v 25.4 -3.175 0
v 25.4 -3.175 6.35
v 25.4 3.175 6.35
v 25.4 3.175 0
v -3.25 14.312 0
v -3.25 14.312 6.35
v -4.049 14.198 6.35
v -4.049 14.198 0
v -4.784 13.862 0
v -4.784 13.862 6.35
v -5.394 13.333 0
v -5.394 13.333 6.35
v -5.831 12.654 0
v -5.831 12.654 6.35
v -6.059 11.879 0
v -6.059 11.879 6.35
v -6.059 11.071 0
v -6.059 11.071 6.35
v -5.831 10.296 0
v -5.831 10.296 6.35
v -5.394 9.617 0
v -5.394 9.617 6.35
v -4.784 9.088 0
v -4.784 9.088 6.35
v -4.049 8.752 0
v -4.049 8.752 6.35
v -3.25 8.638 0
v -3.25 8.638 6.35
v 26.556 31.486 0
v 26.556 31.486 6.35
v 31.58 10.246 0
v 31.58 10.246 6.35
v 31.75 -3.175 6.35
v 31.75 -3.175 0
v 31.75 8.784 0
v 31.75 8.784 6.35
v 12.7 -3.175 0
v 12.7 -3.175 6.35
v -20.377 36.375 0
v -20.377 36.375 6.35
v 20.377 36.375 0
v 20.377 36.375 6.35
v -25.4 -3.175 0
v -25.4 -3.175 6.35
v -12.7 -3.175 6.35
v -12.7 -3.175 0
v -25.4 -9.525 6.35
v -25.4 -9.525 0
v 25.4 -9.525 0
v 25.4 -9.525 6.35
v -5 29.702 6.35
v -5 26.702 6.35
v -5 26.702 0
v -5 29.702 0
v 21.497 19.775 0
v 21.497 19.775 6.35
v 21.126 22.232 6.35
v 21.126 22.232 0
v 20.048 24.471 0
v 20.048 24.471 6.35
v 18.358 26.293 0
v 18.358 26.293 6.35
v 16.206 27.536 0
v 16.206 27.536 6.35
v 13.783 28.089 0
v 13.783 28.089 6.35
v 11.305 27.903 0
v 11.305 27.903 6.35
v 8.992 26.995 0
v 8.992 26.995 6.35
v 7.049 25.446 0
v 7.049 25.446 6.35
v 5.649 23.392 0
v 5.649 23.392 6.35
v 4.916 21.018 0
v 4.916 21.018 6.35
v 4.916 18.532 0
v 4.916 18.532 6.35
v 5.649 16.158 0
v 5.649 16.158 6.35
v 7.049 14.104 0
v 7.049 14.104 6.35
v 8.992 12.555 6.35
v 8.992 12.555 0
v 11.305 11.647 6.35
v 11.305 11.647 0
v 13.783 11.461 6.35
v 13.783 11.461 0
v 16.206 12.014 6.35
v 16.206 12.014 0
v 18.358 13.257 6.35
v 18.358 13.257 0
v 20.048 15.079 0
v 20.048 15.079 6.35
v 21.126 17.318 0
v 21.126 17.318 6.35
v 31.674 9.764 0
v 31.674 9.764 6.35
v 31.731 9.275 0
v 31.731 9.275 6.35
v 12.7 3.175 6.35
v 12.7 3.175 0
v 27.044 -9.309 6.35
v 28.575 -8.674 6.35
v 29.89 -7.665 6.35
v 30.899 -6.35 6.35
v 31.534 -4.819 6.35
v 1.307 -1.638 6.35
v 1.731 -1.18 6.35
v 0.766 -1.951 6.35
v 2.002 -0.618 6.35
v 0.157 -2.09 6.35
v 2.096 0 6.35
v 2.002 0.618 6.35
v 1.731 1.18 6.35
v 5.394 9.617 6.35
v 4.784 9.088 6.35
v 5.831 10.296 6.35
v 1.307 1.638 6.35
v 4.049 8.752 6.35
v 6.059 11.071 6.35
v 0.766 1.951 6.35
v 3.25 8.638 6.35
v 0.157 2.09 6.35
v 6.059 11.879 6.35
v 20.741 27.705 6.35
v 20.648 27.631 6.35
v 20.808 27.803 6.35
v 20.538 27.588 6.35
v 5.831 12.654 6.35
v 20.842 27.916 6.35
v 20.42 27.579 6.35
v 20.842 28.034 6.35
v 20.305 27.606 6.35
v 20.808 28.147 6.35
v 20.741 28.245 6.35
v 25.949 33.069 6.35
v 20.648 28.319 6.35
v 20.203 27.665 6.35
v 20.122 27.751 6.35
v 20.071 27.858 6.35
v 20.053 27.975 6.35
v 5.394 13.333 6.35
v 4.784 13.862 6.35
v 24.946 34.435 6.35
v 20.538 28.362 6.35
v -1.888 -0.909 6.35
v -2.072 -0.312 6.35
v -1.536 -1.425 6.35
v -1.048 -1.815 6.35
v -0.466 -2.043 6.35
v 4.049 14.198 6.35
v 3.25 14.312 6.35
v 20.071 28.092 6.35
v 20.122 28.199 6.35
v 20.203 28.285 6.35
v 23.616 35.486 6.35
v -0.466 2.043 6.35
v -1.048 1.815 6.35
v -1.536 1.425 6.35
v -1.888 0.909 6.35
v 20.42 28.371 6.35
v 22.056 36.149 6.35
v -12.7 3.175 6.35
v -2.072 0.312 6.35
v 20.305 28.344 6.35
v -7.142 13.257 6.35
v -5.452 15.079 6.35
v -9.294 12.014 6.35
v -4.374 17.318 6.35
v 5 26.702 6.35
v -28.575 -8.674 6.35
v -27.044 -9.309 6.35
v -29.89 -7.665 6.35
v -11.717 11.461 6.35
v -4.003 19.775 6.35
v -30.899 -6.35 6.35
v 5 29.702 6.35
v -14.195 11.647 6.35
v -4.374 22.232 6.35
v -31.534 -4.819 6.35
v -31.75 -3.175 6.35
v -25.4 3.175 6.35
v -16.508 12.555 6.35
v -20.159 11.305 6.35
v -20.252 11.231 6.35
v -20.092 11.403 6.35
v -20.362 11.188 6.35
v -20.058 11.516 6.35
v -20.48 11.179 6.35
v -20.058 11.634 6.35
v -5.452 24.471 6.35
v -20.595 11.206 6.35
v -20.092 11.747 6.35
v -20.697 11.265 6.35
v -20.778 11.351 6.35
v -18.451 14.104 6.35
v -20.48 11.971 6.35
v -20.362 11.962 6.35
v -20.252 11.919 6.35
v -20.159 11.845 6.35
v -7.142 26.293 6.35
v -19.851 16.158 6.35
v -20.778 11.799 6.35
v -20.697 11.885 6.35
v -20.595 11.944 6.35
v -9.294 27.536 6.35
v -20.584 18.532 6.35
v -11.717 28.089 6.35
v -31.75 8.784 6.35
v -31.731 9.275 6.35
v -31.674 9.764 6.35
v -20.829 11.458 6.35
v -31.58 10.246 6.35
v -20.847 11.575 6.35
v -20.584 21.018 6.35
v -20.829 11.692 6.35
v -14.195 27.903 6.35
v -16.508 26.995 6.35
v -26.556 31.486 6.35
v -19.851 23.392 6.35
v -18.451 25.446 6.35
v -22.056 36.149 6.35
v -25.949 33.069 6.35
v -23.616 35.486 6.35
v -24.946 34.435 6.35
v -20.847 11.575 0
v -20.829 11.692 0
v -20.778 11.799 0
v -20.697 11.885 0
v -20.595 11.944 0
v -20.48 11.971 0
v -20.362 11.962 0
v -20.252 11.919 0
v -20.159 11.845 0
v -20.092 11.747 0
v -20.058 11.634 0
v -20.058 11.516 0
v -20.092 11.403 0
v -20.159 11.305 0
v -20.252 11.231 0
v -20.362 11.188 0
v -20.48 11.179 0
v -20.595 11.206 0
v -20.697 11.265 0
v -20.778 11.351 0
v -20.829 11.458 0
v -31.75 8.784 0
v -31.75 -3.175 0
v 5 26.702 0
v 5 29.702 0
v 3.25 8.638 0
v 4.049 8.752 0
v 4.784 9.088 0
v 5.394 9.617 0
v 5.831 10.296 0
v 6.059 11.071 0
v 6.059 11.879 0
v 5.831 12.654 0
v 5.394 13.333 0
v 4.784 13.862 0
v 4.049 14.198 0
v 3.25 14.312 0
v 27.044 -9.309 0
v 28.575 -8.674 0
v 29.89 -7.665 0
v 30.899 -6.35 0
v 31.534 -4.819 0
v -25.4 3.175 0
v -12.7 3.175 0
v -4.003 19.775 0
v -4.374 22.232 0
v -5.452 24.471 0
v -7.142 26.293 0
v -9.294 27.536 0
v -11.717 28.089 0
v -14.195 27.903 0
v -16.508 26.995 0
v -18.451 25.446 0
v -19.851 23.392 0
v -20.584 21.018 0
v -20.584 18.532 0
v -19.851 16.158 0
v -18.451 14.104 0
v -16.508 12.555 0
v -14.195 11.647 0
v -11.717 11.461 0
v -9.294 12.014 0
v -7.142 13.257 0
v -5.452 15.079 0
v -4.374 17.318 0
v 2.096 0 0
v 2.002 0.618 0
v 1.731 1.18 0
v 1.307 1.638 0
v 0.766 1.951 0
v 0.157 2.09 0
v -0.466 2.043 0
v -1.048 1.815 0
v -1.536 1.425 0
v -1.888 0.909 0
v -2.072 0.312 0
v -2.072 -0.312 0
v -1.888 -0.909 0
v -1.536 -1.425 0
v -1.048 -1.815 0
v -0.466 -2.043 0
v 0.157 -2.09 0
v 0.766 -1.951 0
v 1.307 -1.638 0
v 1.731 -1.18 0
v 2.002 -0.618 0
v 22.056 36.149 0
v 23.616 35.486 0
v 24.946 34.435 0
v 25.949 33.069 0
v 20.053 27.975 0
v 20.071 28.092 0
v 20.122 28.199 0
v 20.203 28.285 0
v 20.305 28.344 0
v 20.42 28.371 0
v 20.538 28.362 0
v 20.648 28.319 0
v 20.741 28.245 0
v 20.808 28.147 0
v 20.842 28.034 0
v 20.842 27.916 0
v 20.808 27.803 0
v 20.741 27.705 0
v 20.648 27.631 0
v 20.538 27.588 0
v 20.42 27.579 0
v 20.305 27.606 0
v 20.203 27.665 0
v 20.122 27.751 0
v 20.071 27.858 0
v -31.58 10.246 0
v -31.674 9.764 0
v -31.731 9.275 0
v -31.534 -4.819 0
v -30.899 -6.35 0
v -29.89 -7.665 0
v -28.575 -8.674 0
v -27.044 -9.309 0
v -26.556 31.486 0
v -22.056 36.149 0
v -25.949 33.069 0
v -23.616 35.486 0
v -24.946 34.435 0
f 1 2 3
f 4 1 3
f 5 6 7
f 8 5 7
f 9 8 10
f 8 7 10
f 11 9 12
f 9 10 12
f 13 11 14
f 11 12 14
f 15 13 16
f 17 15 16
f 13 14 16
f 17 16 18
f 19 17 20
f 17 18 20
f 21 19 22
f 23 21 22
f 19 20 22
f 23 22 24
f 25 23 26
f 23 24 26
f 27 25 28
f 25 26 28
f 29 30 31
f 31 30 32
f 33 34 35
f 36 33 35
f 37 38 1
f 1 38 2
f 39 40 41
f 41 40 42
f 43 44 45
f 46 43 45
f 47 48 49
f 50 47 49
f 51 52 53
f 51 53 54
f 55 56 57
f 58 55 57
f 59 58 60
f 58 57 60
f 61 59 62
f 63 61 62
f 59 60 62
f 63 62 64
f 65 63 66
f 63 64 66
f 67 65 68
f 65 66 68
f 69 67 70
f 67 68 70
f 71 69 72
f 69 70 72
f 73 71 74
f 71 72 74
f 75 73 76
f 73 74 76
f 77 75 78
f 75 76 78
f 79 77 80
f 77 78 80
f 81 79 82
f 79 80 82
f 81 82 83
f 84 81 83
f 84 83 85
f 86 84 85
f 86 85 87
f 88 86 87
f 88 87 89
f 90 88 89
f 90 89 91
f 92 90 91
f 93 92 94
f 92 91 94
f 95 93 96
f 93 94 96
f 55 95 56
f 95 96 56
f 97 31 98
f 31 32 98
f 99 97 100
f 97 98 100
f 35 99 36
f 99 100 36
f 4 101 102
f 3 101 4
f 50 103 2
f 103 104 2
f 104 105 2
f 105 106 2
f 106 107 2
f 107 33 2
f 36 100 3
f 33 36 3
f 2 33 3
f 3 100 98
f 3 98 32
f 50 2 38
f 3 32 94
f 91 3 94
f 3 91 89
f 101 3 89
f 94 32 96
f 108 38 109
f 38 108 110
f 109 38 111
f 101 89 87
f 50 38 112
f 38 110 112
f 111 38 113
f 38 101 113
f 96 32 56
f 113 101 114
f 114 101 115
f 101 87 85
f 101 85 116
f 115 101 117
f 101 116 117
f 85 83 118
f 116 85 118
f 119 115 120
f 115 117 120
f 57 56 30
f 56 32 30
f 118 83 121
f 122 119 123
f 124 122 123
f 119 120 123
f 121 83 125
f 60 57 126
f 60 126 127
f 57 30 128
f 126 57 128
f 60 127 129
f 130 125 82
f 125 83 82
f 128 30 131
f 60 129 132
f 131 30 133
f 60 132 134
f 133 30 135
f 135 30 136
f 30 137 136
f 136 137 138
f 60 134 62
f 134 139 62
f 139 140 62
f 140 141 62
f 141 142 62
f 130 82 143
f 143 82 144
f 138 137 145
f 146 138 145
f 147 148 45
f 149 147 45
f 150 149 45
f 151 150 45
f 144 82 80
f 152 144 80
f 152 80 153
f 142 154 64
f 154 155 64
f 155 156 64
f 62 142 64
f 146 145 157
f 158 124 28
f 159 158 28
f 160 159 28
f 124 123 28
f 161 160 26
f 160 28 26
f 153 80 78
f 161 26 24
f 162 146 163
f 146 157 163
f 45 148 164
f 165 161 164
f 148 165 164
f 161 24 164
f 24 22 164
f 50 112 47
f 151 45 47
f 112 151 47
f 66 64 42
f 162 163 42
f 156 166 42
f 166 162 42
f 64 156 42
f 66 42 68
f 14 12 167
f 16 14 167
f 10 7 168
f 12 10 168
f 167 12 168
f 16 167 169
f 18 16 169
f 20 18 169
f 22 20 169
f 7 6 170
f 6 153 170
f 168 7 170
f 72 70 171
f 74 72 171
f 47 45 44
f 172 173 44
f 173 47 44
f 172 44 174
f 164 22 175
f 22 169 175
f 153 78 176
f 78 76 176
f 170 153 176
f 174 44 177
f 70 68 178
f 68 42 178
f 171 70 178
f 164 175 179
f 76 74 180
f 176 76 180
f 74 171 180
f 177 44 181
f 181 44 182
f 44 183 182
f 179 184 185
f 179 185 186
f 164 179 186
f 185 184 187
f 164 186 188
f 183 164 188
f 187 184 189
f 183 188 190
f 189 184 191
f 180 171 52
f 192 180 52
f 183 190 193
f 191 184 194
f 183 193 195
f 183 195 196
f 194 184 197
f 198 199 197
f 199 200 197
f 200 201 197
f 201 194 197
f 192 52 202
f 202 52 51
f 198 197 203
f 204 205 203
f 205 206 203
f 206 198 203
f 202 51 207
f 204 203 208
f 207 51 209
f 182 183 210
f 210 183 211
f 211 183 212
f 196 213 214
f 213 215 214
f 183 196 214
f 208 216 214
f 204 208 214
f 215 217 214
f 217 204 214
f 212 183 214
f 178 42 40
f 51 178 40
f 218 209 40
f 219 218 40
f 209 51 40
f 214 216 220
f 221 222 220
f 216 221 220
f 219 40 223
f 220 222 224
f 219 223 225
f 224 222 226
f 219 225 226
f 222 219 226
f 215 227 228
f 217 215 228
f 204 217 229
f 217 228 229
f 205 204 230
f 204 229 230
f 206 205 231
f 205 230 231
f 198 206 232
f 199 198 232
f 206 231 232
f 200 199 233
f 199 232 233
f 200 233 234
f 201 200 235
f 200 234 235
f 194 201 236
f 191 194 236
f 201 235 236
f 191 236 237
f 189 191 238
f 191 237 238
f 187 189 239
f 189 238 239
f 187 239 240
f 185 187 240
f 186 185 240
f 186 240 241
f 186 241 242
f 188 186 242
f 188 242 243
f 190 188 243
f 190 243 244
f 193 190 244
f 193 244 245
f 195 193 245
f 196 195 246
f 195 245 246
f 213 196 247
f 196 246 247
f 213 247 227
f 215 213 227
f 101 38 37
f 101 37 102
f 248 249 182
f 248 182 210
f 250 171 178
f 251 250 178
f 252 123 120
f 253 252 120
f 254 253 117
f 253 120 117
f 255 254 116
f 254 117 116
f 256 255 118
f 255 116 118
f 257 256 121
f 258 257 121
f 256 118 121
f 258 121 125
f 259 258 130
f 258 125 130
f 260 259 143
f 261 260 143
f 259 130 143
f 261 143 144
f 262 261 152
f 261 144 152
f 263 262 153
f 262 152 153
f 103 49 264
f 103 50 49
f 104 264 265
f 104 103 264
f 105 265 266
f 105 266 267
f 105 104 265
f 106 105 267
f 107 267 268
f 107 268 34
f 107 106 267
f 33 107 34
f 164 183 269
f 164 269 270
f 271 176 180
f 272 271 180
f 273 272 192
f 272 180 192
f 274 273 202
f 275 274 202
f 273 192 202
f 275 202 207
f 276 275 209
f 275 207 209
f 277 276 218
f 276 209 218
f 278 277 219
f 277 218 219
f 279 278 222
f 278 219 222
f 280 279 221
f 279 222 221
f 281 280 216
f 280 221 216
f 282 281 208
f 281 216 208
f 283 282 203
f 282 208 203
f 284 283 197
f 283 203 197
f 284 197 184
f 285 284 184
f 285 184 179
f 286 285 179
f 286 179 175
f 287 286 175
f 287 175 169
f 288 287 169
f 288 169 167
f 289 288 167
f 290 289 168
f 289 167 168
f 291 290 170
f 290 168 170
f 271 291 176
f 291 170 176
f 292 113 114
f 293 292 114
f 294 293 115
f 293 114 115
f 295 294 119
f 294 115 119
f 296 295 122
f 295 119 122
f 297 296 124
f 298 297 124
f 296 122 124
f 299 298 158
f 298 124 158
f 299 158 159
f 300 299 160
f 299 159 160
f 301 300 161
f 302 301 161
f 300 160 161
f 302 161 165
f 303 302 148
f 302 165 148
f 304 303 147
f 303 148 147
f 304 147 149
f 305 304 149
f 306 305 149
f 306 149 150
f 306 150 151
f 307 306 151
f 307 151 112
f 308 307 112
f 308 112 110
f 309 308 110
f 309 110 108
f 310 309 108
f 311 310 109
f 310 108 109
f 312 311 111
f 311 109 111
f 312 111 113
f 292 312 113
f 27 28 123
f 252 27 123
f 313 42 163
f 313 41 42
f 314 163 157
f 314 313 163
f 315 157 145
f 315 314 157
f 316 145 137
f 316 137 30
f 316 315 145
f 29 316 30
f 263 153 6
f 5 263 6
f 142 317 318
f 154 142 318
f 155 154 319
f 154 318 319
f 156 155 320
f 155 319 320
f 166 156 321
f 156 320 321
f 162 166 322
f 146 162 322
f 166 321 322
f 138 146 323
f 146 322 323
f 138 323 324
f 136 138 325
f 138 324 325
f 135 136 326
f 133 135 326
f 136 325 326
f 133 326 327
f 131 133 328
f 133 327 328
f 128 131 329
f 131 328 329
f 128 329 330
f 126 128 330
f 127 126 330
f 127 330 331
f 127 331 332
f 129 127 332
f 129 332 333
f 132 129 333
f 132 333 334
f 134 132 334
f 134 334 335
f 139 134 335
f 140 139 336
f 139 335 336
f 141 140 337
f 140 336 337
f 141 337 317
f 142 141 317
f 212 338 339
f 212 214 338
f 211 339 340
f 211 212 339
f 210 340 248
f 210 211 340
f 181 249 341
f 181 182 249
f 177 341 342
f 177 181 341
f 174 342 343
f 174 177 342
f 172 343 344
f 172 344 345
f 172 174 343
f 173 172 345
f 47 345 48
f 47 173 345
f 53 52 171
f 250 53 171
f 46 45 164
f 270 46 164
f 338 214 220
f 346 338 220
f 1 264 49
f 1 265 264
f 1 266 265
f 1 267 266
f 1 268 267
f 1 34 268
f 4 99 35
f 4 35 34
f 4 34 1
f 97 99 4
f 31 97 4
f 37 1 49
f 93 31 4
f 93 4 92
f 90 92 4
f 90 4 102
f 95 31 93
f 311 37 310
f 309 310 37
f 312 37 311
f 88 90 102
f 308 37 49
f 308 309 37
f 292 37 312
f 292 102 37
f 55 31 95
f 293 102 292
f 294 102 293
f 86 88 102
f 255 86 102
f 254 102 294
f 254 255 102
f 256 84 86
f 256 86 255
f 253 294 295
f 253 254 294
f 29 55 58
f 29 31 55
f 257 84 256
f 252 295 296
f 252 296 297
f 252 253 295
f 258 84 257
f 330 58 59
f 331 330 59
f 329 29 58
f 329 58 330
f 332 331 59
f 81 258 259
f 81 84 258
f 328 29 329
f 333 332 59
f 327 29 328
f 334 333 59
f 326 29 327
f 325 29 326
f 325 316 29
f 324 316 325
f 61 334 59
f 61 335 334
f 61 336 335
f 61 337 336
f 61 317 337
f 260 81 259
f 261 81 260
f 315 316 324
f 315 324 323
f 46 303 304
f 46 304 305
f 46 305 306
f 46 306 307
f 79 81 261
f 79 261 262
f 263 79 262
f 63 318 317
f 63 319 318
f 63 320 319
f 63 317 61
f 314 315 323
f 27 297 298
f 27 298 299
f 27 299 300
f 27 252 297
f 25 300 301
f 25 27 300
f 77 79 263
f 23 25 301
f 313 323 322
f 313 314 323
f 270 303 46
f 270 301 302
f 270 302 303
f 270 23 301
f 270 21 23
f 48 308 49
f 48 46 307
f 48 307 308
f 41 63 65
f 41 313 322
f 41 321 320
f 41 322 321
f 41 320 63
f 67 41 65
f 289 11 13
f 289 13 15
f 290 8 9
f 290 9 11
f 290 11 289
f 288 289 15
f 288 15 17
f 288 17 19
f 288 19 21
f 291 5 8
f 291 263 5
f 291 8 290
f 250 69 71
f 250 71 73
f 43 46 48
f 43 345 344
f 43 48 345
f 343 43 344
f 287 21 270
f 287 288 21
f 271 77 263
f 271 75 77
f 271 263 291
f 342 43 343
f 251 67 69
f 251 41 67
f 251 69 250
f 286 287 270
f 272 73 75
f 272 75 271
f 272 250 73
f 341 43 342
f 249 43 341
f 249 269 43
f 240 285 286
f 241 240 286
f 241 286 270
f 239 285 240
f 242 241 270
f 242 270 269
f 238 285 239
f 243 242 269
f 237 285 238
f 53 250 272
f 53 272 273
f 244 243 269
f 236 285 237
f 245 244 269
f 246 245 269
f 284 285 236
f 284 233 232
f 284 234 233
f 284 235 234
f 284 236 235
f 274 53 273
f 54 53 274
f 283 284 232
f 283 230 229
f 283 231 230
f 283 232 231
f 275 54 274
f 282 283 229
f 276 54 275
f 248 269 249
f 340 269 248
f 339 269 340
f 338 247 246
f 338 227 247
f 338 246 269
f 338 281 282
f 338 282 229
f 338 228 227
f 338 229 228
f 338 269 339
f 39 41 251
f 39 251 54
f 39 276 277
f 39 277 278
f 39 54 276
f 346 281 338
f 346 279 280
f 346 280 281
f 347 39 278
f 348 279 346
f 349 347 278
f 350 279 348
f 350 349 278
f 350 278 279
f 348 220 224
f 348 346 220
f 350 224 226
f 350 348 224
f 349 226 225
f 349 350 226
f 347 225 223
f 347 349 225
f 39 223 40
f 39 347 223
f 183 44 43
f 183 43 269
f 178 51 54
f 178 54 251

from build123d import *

# Parameters (mm, degrees)
SKETCH1_W           = 63.5
SKETCH1_H           = 19.05
BOSS_EXTRUDE1_DEPTH = 6.35
SKETCH2_R           = 2.0955
SKETCH2_W           = 12.7
SKETCH2_H           = 6.35
CUT_EXTRUDE1_DEPTH  = 6.35
BOSS_EXTRUDE2_DEPTH = 6.35
SKETCH4_W           = 10
SKETCH4_H           = 3
CUT_EXTRUDE2_DEPTH  = 6.35
SKETCH5_R           = 8.336875
CUT_EXTRUDE3_DEPTH  = 6.35
SKETCH6_R           = 0.396875
CUT_EXTRUDE4_DEPTH  = 6.35
FILLET1_R           = 6.35


with BuildPart() as part:
    # Sketch1 → Boss-Extrude1 (new body)
    with BuildSketch(Plane.XY):
        Rectangle(SKETCH1_W, SKETCH1_H)
    extrude(amount=BOSS_EXTRUDE1_DEPTH)

    # Sketch2 → Cut-Extrude1 (cut)
    with BuildSketch(Plane.XY.offset(6.35)):
        Circle(SKETCH2_R)
        with Locations((-19.05, 0)):
            Rectangle(SKETCH2_W, SKETCH2_H)
        with Locations((19.05, 0)):
            Rectangle(SKETCH2_W, SKETCH2_H)
    extrude(amount=-CUT_EXTRUDE1_DEPTH, mode=Mode.SUBTRACT)

    # Sketch3 → Boss-Extrude2 (add)
    with BuildSketch(Plane.XY.offset(6.35)):
        Polygon((-31.75, 9.525), (-25.4, 36.375), (25.4, 36.375), (31.75, 9.525), align=None)
    extrude(amount=-BOSS_EXTRUDE2_DEPTH)

    # Sketch4 → Cut-Extrude2 (cut)
    with BuildSketch(Plane.XY.offset(6.35)):
        with BuildLine():
            Line((-3.25, 8.6375), (3.25, 8.6375))
            ThreePointArc((3.25, 8.6375), (6.0875, 11.475), (3.25, 14.3125))
            Line((3.25, 14.3125), (-3.25, 14.3125))
            ThreePointArc((-3.25, 14.3125), (-6.0875, 11.475), (-3.25, 8.6375))
        make_face()
        with Locations((0, 28.2025)):
            Rectangle(SKETCH4_W, SKETCH4_H)
    extrude(amount=-CUT_EXTRUDE2_DEPTH, mode=Mode.SUBTRACT)

    # Sketch5 → Cut-Extrude3 (cut)
    with BuildSketch(Plane.XY.offset(6.35)):
        with Locations((-12.34, 19.775)):
            Circle(SKETCH5_R)
        with Locations((13.16, 19.775)):
            Circle(SKETCH5_R)
    extrude(amount=-CUT_EXTRUDE3_DEPTH, mode=Mode.SUBTRACT)

    # Sketch6 → Cut-Extrude4 (cut)
    with BuildSketch(Plane(origin=(0, 0, 0), x_dir=(-1, 0, 0), z_dir=(0, 0, -1))):
        with Locations((20.45, 11.575)):
            Circle(SKETCH6_R)
        with Locations((-20.45, 27.975)):
            Circle(SKETCH6_R)
    extrude(amount=-CUT_EXTRUDE4_DEPTH, mode=Mode.SUBTRACT)

    # Fillet1
    fillet1_edges = [part.edges().sort_by_distance(p)[0] for p in [
        (-25.4, 36.375, 3.175),
        (25.4, 36.375, 3.175),
        (31.75, -9.525, 3.175),
        (-31.75, -9.525, 3.175),
        (-31.75, 9.525, 3.175),
        (31.75, 9.525, 3.175),
    ]]
    fillet(fillet1_edges, radius=FILLET1_R)


solid = part.part
